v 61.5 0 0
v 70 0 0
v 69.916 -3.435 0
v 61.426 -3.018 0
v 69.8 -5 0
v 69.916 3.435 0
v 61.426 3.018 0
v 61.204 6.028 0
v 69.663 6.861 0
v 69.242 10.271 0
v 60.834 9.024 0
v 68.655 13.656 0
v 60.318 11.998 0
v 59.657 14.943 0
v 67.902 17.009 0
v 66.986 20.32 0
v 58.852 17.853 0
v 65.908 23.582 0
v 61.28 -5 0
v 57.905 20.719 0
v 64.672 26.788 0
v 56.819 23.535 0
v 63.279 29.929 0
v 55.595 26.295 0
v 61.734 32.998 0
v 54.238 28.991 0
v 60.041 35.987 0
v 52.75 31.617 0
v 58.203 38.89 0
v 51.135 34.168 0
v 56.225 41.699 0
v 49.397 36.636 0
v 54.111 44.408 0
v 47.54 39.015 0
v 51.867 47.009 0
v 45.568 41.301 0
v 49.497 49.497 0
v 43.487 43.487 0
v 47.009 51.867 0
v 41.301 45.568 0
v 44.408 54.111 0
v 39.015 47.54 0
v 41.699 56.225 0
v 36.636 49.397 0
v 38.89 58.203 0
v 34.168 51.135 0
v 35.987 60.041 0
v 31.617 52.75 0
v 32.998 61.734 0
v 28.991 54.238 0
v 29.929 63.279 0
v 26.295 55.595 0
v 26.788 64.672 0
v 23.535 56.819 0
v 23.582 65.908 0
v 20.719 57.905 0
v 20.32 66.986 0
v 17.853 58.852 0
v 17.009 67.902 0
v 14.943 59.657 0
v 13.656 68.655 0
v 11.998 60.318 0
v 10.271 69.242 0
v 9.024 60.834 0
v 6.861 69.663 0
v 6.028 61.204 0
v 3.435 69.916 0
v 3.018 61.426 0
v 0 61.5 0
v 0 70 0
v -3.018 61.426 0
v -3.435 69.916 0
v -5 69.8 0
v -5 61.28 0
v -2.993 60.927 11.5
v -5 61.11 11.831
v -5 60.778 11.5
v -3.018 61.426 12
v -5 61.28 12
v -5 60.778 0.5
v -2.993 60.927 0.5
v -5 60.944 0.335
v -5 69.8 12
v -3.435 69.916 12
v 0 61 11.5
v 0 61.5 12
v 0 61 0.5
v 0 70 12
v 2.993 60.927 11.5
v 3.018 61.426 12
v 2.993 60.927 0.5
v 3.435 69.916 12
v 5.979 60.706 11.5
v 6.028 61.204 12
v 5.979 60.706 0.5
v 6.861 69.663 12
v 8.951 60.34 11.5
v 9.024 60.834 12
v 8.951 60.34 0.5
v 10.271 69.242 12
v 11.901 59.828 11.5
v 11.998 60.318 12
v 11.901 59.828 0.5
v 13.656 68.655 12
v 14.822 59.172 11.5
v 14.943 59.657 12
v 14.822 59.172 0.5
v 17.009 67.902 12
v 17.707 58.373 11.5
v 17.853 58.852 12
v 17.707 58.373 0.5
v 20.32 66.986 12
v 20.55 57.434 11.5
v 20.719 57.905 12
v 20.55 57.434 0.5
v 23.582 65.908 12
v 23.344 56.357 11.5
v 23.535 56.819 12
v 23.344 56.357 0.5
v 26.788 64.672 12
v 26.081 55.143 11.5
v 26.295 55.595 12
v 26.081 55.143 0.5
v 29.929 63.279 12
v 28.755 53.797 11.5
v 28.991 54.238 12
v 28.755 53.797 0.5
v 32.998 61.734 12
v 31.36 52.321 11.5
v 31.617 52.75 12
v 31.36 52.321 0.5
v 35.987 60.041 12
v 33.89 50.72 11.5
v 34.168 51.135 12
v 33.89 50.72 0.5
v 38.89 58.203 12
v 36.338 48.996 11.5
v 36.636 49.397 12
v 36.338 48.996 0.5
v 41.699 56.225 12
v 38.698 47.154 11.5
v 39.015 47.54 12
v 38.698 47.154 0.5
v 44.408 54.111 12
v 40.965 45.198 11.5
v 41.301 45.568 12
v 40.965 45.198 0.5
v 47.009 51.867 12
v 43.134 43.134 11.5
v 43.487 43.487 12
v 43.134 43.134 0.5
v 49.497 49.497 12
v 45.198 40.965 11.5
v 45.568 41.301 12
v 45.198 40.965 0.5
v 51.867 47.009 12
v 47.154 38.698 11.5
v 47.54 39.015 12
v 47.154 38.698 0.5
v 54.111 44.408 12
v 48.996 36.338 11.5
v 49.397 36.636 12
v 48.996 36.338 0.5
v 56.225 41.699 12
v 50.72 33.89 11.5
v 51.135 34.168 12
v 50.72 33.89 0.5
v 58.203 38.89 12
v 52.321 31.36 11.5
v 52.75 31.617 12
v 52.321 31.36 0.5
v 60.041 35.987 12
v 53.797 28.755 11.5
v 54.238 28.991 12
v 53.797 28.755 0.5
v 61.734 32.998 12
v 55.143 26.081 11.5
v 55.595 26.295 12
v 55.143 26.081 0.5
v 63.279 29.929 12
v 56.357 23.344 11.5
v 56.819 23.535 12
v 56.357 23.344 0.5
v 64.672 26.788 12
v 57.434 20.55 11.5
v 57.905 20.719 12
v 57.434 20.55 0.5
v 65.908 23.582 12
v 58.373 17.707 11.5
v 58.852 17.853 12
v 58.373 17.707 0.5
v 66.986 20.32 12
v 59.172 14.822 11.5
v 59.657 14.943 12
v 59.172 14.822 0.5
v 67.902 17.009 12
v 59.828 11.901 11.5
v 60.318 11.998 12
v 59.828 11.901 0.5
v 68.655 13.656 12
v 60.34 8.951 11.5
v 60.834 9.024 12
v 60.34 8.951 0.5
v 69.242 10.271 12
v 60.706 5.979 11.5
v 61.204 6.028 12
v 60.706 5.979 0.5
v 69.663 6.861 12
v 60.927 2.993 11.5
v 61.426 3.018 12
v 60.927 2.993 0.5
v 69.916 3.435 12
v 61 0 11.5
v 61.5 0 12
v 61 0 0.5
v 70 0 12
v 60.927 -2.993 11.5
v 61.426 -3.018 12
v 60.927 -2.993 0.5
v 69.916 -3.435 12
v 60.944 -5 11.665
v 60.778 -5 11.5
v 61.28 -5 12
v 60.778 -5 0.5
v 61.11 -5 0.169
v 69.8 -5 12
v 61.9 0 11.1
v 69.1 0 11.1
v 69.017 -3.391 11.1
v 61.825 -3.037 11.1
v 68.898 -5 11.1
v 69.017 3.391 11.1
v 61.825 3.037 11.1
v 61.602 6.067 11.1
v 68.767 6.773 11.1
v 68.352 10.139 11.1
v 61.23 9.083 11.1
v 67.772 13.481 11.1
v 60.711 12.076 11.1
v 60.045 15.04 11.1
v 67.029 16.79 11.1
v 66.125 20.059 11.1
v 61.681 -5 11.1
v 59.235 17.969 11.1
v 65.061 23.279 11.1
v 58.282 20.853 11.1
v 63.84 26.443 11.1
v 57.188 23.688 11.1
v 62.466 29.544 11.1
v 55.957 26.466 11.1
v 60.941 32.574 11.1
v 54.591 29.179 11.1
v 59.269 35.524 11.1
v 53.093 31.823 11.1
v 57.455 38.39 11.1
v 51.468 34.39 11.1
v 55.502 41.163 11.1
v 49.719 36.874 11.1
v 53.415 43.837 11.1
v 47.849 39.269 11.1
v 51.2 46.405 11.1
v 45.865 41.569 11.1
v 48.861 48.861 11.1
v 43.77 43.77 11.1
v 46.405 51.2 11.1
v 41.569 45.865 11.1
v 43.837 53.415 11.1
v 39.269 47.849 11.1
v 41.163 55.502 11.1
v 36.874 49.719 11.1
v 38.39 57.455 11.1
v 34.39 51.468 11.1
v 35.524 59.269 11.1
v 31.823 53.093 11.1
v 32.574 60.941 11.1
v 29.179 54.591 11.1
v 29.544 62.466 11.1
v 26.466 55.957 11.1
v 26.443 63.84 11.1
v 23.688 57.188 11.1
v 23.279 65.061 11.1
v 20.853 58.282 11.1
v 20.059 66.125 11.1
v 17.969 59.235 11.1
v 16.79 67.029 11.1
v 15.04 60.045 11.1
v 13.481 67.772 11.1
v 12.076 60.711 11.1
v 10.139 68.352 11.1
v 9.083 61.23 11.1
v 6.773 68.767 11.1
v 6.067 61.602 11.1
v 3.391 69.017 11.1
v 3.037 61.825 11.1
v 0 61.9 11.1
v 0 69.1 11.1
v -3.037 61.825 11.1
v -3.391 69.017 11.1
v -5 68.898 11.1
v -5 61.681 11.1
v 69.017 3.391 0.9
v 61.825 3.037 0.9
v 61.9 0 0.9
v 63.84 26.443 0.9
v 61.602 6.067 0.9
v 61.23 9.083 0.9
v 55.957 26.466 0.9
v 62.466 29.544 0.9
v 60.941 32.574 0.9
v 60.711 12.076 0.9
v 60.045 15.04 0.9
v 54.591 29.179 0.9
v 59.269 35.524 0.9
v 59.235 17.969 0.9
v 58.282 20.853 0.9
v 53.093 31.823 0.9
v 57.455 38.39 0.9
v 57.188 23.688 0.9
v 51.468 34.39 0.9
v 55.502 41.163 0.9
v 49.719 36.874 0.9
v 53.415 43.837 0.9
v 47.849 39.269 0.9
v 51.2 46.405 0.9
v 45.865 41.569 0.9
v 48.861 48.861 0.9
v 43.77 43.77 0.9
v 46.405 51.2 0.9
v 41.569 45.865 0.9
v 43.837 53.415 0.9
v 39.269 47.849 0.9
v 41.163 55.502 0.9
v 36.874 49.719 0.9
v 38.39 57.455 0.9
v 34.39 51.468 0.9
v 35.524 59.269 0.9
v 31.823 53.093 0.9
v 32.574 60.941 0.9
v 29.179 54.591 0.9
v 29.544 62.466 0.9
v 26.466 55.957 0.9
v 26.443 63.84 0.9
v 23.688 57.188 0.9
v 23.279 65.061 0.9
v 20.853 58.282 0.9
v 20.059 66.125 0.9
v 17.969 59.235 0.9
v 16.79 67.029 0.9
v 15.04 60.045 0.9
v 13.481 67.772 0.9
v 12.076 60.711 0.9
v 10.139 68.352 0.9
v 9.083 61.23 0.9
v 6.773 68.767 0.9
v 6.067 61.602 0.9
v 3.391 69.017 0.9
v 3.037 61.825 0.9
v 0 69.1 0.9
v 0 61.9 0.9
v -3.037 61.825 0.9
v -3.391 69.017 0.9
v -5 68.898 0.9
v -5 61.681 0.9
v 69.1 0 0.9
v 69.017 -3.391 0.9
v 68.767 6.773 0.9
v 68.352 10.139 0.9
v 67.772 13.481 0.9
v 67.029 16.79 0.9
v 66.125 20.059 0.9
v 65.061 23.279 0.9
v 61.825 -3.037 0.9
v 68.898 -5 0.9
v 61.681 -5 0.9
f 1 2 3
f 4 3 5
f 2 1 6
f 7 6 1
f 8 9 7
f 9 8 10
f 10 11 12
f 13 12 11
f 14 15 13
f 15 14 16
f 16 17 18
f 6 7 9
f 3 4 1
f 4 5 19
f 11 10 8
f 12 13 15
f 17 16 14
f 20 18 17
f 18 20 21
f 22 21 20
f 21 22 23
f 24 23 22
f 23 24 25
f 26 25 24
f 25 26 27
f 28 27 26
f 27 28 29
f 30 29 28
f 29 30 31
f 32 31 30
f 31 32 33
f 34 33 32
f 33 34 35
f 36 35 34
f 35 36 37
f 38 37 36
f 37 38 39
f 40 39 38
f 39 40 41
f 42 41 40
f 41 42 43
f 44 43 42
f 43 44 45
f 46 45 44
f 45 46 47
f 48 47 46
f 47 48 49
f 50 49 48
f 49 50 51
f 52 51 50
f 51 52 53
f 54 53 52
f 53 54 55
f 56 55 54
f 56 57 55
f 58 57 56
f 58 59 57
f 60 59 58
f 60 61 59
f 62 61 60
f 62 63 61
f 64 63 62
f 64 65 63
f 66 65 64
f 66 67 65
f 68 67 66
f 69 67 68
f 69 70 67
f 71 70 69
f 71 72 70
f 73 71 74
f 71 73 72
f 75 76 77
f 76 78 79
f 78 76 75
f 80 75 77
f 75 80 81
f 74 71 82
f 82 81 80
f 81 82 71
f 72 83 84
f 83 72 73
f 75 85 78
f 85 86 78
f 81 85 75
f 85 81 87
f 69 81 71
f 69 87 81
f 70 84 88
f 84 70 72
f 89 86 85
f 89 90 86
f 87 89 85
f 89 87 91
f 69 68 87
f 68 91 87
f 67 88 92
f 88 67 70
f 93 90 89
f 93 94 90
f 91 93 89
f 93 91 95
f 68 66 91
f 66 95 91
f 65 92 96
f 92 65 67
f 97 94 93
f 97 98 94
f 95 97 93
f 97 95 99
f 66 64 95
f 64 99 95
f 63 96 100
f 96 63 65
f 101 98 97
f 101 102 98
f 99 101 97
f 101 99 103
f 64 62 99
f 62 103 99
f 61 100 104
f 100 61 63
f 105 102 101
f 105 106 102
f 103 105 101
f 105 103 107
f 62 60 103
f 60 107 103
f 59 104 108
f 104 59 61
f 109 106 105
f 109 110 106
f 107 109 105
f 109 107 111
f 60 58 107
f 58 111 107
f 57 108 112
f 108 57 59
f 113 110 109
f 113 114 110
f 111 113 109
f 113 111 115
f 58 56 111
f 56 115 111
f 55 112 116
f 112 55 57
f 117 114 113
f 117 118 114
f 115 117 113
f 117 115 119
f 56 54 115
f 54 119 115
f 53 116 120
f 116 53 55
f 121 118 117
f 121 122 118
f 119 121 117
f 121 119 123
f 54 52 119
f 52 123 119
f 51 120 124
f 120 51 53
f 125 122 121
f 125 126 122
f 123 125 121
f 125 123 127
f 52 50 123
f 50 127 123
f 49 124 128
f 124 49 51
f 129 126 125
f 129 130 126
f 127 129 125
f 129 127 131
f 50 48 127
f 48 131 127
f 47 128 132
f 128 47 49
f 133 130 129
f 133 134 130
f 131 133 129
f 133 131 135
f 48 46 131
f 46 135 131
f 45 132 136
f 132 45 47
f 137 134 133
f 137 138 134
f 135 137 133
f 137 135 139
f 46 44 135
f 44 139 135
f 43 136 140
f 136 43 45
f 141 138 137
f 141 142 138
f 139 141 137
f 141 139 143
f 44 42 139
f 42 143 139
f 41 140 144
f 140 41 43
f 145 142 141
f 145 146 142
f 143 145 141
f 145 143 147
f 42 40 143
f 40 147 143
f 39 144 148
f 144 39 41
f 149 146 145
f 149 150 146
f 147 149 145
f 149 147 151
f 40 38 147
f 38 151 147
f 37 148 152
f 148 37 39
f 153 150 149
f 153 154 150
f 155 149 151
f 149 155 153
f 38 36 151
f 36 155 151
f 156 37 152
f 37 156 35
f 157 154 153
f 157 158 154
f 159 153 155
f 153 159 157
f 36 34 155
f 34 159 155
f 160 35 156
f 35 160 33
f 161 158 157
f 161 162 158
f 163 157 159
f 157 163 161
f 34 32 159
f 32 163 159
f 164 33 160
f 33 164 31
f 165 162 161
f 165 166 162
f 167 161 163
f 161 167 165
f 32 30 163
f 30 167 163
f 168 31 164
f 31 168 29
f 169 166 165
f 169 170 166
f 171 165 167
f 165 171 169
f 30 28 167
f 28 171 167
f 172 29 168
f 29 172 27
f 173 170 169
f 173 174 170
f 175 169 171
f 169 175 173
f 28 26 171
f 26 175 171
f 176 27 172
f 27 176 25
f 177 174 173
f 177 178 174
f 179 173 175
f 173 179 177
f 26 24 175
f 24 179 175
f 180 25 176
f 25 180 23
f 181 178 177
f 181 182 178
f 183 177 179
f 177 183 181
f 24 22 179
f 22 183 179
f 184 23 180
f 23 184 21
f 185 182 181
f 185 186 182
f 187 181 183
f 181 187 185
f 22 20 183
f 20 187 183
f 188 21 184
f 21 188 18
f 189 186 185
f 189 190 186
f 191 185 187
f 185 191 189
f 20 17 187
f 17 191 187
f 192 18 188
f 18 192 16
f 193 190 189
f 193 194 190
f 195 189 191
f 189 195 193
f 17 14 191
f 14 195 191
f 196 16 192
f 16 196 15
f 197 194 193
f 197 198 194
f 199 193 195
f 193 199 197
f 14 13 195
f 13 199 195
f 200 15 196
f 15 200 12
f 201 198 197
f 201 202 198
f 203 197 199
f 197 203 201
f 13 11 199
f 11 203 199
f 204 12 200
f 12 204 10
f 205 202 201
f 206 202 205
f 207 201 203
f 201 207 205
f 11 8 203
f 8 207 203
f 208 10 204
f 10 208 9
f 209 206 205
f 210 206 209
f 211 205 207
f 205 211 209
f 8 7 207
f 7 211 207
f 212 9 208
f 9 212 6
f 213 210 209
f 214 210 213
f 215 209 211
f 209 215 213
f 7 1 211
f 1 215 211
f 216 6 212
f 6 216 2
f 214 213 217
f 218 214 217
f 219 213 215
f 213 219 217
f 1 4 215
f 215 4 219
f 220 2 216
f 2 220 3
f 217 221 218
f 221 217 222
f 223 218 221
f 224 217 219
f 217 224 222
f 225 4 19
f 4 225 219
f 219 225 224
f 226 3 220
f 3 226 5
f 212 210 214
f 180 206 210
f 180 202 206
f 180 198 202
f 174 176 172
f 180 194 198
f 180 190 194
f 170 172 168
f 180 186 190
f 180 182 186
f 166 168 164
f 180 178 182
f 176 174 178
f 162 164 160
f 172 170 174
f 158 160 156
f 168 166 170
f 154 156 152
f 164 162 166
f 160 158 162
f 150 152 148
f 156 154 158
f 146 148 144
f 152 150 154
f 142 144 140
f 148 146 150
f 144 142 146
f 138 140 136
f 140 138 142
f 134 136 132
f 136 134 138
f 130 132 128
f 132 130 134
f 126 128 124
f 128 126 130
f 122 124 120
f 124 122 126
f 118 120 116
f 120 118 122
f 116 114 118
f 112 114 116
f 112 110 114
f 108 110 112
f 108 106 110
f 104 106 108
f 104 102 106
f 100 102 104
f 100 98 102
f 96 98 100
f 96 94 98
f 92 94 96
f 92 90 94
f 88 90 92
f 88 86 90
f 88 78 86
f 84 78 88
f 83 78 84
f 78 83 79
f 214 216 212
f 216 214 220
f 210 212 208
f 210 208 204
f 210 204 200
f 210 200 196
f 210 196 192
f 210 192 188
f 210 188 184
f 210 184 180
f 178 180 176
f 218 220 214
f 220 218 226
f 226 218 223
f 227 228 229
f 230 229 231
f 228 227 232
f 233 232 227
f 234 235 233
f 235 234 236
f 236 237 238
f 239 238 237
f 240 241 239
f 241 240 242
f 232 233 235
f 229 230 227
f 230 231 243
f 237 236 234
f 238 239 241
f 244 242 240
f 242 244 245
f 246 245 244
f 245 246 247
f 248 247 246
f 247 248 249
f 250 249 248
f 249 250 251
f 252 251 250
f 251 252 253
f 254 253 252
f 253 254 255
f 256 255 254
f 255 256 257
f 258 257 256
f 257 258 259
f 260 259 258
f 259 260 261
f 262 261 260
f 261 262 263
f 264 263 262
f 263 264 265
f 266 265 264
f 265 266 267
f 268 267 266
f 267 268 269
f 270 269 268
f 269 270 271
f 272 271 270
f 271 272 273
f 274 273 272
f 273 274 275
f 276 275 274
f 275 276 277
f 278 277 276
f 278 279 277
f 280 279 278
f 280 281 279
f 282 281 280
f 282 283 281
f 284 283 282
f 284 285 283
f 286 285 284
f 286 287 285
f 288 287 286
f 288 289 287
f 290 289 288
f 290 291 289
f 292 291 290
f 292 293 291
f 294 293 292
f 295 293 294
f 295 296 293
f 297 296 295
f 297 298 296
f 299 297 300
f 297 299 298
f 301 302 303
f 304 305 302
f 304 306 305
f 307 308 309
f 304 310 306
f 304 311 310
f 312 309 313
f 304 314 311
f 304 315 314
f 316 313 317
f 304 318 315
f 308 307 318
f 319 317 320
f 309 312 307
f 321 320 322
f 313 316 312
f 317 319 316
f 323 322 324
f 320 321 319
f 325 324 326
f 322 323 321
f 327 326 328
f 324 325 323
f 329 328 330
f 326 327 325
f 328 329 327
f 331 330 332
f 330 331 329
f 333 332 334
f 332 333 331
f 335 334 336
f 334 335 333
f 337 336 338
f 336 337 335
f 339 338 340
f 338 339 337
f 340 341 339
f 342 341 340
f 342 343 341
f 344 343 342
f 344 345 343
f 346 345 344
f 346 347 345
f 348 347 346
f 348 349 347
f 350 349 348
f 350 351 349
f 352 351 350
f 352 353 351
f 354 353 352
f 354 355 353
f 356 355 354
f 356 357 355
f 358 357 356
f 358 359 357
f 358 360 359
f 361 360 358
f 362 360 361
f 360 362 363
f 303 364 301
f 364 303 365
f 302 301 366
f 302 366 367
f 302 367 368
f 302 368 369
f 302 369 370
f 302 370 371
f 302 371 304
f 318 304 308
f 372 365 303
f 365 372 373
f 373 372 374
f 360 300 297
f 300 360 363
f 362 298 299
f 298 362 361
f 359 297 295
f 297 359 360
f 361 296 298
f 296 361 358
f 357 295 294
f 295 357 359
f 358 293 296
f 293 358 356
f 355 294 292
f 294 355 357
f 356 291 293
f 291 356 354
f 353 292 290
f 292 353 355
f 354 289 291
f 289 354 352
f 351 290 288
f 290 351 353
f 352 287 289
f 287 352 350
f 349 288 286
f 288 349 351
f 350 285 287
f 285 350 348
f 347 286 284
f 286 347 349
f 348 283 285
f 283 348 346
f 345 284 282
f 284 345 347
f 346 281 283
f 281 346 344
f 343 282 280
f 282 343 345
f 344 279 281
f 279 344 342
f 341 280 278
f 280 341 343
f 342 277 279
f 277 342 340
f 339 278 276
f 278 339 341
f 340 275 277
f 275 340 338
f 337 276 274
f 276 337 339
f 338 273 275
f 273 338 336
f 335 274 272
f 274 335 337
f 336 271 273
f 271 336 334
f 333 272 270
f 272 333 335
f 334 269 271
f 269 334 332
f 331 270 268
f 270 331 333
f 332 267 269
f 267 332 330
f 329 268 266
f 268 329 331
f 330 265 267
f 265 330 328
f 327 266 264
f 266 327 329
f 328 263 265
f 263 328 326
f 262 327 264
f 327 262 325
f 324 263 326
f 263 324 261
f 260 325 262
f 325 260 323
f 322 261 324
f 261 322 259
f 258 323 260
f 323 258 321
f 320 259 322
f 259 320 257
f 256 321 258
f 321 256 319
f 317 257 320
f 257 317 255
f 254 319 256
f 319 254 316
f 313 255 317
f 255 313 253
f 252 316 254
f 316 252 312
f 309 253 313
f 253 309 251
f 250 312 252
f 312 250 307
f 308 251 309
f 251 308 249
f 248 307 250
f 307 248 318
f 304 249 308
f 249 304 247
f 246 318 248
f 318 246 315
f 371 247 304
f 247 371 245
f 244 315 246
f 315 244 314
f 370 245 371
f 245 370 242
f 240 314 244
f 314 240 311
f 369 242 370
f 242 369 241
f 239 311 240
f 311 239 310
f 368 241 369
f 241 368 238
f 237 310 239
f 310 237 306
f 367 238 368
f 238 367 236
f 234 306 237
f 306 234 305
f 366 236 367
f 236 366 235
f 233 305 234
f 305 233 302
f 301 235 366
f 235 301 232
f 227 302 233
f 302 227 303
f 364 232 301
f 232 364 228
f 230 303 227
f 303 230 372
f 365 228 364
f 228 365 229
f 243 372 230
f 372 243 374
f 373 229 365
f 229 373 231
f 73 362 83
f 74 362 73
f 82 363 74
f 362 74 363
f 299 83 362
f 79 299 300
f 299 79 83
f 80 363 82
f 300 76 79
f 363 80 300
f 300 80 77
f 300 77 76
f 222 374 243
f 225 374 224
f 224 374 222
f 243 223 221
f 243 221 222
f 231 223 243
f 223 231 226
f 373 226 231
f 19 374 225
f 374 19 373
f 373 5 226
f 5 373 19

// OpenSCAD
/**
 * This work is licensed under a <a rel="license" href="https://creativecommons.org/licenses/by-sa/4.0/">Creative Commons Attribution 4.0 Unported License</a>.
 * You can find this on thingiverse: http://www.thingiverse.com/thing:1995025
 */

width = 12;
corner_radius = 70;
depth = 9;
thickness = 1.8;
chamfer_size=0.5;

module profil() {
    difference() {
        polygon([
            [0, chamfer_size],
            [0, width-chamfer_size],
            [chamfer_size, width],
            [depth, width],
            [depth, 0],
            [chamfer_size, 0]
        ]);
        translate([thickness/2, thickness/2]) {
            square([depth-thickness, width-thickness]);
        }
    }
}

$fn=128;
intersection() {
    rotate_extrude(convexity = 10)
    translate([corner_radius-depth, 0, 0])
    profil();
    translate([-5, -5, 0]) {
        cube([corner_radius+20, corner_radius+20 , corner_radius]);
    }
}
